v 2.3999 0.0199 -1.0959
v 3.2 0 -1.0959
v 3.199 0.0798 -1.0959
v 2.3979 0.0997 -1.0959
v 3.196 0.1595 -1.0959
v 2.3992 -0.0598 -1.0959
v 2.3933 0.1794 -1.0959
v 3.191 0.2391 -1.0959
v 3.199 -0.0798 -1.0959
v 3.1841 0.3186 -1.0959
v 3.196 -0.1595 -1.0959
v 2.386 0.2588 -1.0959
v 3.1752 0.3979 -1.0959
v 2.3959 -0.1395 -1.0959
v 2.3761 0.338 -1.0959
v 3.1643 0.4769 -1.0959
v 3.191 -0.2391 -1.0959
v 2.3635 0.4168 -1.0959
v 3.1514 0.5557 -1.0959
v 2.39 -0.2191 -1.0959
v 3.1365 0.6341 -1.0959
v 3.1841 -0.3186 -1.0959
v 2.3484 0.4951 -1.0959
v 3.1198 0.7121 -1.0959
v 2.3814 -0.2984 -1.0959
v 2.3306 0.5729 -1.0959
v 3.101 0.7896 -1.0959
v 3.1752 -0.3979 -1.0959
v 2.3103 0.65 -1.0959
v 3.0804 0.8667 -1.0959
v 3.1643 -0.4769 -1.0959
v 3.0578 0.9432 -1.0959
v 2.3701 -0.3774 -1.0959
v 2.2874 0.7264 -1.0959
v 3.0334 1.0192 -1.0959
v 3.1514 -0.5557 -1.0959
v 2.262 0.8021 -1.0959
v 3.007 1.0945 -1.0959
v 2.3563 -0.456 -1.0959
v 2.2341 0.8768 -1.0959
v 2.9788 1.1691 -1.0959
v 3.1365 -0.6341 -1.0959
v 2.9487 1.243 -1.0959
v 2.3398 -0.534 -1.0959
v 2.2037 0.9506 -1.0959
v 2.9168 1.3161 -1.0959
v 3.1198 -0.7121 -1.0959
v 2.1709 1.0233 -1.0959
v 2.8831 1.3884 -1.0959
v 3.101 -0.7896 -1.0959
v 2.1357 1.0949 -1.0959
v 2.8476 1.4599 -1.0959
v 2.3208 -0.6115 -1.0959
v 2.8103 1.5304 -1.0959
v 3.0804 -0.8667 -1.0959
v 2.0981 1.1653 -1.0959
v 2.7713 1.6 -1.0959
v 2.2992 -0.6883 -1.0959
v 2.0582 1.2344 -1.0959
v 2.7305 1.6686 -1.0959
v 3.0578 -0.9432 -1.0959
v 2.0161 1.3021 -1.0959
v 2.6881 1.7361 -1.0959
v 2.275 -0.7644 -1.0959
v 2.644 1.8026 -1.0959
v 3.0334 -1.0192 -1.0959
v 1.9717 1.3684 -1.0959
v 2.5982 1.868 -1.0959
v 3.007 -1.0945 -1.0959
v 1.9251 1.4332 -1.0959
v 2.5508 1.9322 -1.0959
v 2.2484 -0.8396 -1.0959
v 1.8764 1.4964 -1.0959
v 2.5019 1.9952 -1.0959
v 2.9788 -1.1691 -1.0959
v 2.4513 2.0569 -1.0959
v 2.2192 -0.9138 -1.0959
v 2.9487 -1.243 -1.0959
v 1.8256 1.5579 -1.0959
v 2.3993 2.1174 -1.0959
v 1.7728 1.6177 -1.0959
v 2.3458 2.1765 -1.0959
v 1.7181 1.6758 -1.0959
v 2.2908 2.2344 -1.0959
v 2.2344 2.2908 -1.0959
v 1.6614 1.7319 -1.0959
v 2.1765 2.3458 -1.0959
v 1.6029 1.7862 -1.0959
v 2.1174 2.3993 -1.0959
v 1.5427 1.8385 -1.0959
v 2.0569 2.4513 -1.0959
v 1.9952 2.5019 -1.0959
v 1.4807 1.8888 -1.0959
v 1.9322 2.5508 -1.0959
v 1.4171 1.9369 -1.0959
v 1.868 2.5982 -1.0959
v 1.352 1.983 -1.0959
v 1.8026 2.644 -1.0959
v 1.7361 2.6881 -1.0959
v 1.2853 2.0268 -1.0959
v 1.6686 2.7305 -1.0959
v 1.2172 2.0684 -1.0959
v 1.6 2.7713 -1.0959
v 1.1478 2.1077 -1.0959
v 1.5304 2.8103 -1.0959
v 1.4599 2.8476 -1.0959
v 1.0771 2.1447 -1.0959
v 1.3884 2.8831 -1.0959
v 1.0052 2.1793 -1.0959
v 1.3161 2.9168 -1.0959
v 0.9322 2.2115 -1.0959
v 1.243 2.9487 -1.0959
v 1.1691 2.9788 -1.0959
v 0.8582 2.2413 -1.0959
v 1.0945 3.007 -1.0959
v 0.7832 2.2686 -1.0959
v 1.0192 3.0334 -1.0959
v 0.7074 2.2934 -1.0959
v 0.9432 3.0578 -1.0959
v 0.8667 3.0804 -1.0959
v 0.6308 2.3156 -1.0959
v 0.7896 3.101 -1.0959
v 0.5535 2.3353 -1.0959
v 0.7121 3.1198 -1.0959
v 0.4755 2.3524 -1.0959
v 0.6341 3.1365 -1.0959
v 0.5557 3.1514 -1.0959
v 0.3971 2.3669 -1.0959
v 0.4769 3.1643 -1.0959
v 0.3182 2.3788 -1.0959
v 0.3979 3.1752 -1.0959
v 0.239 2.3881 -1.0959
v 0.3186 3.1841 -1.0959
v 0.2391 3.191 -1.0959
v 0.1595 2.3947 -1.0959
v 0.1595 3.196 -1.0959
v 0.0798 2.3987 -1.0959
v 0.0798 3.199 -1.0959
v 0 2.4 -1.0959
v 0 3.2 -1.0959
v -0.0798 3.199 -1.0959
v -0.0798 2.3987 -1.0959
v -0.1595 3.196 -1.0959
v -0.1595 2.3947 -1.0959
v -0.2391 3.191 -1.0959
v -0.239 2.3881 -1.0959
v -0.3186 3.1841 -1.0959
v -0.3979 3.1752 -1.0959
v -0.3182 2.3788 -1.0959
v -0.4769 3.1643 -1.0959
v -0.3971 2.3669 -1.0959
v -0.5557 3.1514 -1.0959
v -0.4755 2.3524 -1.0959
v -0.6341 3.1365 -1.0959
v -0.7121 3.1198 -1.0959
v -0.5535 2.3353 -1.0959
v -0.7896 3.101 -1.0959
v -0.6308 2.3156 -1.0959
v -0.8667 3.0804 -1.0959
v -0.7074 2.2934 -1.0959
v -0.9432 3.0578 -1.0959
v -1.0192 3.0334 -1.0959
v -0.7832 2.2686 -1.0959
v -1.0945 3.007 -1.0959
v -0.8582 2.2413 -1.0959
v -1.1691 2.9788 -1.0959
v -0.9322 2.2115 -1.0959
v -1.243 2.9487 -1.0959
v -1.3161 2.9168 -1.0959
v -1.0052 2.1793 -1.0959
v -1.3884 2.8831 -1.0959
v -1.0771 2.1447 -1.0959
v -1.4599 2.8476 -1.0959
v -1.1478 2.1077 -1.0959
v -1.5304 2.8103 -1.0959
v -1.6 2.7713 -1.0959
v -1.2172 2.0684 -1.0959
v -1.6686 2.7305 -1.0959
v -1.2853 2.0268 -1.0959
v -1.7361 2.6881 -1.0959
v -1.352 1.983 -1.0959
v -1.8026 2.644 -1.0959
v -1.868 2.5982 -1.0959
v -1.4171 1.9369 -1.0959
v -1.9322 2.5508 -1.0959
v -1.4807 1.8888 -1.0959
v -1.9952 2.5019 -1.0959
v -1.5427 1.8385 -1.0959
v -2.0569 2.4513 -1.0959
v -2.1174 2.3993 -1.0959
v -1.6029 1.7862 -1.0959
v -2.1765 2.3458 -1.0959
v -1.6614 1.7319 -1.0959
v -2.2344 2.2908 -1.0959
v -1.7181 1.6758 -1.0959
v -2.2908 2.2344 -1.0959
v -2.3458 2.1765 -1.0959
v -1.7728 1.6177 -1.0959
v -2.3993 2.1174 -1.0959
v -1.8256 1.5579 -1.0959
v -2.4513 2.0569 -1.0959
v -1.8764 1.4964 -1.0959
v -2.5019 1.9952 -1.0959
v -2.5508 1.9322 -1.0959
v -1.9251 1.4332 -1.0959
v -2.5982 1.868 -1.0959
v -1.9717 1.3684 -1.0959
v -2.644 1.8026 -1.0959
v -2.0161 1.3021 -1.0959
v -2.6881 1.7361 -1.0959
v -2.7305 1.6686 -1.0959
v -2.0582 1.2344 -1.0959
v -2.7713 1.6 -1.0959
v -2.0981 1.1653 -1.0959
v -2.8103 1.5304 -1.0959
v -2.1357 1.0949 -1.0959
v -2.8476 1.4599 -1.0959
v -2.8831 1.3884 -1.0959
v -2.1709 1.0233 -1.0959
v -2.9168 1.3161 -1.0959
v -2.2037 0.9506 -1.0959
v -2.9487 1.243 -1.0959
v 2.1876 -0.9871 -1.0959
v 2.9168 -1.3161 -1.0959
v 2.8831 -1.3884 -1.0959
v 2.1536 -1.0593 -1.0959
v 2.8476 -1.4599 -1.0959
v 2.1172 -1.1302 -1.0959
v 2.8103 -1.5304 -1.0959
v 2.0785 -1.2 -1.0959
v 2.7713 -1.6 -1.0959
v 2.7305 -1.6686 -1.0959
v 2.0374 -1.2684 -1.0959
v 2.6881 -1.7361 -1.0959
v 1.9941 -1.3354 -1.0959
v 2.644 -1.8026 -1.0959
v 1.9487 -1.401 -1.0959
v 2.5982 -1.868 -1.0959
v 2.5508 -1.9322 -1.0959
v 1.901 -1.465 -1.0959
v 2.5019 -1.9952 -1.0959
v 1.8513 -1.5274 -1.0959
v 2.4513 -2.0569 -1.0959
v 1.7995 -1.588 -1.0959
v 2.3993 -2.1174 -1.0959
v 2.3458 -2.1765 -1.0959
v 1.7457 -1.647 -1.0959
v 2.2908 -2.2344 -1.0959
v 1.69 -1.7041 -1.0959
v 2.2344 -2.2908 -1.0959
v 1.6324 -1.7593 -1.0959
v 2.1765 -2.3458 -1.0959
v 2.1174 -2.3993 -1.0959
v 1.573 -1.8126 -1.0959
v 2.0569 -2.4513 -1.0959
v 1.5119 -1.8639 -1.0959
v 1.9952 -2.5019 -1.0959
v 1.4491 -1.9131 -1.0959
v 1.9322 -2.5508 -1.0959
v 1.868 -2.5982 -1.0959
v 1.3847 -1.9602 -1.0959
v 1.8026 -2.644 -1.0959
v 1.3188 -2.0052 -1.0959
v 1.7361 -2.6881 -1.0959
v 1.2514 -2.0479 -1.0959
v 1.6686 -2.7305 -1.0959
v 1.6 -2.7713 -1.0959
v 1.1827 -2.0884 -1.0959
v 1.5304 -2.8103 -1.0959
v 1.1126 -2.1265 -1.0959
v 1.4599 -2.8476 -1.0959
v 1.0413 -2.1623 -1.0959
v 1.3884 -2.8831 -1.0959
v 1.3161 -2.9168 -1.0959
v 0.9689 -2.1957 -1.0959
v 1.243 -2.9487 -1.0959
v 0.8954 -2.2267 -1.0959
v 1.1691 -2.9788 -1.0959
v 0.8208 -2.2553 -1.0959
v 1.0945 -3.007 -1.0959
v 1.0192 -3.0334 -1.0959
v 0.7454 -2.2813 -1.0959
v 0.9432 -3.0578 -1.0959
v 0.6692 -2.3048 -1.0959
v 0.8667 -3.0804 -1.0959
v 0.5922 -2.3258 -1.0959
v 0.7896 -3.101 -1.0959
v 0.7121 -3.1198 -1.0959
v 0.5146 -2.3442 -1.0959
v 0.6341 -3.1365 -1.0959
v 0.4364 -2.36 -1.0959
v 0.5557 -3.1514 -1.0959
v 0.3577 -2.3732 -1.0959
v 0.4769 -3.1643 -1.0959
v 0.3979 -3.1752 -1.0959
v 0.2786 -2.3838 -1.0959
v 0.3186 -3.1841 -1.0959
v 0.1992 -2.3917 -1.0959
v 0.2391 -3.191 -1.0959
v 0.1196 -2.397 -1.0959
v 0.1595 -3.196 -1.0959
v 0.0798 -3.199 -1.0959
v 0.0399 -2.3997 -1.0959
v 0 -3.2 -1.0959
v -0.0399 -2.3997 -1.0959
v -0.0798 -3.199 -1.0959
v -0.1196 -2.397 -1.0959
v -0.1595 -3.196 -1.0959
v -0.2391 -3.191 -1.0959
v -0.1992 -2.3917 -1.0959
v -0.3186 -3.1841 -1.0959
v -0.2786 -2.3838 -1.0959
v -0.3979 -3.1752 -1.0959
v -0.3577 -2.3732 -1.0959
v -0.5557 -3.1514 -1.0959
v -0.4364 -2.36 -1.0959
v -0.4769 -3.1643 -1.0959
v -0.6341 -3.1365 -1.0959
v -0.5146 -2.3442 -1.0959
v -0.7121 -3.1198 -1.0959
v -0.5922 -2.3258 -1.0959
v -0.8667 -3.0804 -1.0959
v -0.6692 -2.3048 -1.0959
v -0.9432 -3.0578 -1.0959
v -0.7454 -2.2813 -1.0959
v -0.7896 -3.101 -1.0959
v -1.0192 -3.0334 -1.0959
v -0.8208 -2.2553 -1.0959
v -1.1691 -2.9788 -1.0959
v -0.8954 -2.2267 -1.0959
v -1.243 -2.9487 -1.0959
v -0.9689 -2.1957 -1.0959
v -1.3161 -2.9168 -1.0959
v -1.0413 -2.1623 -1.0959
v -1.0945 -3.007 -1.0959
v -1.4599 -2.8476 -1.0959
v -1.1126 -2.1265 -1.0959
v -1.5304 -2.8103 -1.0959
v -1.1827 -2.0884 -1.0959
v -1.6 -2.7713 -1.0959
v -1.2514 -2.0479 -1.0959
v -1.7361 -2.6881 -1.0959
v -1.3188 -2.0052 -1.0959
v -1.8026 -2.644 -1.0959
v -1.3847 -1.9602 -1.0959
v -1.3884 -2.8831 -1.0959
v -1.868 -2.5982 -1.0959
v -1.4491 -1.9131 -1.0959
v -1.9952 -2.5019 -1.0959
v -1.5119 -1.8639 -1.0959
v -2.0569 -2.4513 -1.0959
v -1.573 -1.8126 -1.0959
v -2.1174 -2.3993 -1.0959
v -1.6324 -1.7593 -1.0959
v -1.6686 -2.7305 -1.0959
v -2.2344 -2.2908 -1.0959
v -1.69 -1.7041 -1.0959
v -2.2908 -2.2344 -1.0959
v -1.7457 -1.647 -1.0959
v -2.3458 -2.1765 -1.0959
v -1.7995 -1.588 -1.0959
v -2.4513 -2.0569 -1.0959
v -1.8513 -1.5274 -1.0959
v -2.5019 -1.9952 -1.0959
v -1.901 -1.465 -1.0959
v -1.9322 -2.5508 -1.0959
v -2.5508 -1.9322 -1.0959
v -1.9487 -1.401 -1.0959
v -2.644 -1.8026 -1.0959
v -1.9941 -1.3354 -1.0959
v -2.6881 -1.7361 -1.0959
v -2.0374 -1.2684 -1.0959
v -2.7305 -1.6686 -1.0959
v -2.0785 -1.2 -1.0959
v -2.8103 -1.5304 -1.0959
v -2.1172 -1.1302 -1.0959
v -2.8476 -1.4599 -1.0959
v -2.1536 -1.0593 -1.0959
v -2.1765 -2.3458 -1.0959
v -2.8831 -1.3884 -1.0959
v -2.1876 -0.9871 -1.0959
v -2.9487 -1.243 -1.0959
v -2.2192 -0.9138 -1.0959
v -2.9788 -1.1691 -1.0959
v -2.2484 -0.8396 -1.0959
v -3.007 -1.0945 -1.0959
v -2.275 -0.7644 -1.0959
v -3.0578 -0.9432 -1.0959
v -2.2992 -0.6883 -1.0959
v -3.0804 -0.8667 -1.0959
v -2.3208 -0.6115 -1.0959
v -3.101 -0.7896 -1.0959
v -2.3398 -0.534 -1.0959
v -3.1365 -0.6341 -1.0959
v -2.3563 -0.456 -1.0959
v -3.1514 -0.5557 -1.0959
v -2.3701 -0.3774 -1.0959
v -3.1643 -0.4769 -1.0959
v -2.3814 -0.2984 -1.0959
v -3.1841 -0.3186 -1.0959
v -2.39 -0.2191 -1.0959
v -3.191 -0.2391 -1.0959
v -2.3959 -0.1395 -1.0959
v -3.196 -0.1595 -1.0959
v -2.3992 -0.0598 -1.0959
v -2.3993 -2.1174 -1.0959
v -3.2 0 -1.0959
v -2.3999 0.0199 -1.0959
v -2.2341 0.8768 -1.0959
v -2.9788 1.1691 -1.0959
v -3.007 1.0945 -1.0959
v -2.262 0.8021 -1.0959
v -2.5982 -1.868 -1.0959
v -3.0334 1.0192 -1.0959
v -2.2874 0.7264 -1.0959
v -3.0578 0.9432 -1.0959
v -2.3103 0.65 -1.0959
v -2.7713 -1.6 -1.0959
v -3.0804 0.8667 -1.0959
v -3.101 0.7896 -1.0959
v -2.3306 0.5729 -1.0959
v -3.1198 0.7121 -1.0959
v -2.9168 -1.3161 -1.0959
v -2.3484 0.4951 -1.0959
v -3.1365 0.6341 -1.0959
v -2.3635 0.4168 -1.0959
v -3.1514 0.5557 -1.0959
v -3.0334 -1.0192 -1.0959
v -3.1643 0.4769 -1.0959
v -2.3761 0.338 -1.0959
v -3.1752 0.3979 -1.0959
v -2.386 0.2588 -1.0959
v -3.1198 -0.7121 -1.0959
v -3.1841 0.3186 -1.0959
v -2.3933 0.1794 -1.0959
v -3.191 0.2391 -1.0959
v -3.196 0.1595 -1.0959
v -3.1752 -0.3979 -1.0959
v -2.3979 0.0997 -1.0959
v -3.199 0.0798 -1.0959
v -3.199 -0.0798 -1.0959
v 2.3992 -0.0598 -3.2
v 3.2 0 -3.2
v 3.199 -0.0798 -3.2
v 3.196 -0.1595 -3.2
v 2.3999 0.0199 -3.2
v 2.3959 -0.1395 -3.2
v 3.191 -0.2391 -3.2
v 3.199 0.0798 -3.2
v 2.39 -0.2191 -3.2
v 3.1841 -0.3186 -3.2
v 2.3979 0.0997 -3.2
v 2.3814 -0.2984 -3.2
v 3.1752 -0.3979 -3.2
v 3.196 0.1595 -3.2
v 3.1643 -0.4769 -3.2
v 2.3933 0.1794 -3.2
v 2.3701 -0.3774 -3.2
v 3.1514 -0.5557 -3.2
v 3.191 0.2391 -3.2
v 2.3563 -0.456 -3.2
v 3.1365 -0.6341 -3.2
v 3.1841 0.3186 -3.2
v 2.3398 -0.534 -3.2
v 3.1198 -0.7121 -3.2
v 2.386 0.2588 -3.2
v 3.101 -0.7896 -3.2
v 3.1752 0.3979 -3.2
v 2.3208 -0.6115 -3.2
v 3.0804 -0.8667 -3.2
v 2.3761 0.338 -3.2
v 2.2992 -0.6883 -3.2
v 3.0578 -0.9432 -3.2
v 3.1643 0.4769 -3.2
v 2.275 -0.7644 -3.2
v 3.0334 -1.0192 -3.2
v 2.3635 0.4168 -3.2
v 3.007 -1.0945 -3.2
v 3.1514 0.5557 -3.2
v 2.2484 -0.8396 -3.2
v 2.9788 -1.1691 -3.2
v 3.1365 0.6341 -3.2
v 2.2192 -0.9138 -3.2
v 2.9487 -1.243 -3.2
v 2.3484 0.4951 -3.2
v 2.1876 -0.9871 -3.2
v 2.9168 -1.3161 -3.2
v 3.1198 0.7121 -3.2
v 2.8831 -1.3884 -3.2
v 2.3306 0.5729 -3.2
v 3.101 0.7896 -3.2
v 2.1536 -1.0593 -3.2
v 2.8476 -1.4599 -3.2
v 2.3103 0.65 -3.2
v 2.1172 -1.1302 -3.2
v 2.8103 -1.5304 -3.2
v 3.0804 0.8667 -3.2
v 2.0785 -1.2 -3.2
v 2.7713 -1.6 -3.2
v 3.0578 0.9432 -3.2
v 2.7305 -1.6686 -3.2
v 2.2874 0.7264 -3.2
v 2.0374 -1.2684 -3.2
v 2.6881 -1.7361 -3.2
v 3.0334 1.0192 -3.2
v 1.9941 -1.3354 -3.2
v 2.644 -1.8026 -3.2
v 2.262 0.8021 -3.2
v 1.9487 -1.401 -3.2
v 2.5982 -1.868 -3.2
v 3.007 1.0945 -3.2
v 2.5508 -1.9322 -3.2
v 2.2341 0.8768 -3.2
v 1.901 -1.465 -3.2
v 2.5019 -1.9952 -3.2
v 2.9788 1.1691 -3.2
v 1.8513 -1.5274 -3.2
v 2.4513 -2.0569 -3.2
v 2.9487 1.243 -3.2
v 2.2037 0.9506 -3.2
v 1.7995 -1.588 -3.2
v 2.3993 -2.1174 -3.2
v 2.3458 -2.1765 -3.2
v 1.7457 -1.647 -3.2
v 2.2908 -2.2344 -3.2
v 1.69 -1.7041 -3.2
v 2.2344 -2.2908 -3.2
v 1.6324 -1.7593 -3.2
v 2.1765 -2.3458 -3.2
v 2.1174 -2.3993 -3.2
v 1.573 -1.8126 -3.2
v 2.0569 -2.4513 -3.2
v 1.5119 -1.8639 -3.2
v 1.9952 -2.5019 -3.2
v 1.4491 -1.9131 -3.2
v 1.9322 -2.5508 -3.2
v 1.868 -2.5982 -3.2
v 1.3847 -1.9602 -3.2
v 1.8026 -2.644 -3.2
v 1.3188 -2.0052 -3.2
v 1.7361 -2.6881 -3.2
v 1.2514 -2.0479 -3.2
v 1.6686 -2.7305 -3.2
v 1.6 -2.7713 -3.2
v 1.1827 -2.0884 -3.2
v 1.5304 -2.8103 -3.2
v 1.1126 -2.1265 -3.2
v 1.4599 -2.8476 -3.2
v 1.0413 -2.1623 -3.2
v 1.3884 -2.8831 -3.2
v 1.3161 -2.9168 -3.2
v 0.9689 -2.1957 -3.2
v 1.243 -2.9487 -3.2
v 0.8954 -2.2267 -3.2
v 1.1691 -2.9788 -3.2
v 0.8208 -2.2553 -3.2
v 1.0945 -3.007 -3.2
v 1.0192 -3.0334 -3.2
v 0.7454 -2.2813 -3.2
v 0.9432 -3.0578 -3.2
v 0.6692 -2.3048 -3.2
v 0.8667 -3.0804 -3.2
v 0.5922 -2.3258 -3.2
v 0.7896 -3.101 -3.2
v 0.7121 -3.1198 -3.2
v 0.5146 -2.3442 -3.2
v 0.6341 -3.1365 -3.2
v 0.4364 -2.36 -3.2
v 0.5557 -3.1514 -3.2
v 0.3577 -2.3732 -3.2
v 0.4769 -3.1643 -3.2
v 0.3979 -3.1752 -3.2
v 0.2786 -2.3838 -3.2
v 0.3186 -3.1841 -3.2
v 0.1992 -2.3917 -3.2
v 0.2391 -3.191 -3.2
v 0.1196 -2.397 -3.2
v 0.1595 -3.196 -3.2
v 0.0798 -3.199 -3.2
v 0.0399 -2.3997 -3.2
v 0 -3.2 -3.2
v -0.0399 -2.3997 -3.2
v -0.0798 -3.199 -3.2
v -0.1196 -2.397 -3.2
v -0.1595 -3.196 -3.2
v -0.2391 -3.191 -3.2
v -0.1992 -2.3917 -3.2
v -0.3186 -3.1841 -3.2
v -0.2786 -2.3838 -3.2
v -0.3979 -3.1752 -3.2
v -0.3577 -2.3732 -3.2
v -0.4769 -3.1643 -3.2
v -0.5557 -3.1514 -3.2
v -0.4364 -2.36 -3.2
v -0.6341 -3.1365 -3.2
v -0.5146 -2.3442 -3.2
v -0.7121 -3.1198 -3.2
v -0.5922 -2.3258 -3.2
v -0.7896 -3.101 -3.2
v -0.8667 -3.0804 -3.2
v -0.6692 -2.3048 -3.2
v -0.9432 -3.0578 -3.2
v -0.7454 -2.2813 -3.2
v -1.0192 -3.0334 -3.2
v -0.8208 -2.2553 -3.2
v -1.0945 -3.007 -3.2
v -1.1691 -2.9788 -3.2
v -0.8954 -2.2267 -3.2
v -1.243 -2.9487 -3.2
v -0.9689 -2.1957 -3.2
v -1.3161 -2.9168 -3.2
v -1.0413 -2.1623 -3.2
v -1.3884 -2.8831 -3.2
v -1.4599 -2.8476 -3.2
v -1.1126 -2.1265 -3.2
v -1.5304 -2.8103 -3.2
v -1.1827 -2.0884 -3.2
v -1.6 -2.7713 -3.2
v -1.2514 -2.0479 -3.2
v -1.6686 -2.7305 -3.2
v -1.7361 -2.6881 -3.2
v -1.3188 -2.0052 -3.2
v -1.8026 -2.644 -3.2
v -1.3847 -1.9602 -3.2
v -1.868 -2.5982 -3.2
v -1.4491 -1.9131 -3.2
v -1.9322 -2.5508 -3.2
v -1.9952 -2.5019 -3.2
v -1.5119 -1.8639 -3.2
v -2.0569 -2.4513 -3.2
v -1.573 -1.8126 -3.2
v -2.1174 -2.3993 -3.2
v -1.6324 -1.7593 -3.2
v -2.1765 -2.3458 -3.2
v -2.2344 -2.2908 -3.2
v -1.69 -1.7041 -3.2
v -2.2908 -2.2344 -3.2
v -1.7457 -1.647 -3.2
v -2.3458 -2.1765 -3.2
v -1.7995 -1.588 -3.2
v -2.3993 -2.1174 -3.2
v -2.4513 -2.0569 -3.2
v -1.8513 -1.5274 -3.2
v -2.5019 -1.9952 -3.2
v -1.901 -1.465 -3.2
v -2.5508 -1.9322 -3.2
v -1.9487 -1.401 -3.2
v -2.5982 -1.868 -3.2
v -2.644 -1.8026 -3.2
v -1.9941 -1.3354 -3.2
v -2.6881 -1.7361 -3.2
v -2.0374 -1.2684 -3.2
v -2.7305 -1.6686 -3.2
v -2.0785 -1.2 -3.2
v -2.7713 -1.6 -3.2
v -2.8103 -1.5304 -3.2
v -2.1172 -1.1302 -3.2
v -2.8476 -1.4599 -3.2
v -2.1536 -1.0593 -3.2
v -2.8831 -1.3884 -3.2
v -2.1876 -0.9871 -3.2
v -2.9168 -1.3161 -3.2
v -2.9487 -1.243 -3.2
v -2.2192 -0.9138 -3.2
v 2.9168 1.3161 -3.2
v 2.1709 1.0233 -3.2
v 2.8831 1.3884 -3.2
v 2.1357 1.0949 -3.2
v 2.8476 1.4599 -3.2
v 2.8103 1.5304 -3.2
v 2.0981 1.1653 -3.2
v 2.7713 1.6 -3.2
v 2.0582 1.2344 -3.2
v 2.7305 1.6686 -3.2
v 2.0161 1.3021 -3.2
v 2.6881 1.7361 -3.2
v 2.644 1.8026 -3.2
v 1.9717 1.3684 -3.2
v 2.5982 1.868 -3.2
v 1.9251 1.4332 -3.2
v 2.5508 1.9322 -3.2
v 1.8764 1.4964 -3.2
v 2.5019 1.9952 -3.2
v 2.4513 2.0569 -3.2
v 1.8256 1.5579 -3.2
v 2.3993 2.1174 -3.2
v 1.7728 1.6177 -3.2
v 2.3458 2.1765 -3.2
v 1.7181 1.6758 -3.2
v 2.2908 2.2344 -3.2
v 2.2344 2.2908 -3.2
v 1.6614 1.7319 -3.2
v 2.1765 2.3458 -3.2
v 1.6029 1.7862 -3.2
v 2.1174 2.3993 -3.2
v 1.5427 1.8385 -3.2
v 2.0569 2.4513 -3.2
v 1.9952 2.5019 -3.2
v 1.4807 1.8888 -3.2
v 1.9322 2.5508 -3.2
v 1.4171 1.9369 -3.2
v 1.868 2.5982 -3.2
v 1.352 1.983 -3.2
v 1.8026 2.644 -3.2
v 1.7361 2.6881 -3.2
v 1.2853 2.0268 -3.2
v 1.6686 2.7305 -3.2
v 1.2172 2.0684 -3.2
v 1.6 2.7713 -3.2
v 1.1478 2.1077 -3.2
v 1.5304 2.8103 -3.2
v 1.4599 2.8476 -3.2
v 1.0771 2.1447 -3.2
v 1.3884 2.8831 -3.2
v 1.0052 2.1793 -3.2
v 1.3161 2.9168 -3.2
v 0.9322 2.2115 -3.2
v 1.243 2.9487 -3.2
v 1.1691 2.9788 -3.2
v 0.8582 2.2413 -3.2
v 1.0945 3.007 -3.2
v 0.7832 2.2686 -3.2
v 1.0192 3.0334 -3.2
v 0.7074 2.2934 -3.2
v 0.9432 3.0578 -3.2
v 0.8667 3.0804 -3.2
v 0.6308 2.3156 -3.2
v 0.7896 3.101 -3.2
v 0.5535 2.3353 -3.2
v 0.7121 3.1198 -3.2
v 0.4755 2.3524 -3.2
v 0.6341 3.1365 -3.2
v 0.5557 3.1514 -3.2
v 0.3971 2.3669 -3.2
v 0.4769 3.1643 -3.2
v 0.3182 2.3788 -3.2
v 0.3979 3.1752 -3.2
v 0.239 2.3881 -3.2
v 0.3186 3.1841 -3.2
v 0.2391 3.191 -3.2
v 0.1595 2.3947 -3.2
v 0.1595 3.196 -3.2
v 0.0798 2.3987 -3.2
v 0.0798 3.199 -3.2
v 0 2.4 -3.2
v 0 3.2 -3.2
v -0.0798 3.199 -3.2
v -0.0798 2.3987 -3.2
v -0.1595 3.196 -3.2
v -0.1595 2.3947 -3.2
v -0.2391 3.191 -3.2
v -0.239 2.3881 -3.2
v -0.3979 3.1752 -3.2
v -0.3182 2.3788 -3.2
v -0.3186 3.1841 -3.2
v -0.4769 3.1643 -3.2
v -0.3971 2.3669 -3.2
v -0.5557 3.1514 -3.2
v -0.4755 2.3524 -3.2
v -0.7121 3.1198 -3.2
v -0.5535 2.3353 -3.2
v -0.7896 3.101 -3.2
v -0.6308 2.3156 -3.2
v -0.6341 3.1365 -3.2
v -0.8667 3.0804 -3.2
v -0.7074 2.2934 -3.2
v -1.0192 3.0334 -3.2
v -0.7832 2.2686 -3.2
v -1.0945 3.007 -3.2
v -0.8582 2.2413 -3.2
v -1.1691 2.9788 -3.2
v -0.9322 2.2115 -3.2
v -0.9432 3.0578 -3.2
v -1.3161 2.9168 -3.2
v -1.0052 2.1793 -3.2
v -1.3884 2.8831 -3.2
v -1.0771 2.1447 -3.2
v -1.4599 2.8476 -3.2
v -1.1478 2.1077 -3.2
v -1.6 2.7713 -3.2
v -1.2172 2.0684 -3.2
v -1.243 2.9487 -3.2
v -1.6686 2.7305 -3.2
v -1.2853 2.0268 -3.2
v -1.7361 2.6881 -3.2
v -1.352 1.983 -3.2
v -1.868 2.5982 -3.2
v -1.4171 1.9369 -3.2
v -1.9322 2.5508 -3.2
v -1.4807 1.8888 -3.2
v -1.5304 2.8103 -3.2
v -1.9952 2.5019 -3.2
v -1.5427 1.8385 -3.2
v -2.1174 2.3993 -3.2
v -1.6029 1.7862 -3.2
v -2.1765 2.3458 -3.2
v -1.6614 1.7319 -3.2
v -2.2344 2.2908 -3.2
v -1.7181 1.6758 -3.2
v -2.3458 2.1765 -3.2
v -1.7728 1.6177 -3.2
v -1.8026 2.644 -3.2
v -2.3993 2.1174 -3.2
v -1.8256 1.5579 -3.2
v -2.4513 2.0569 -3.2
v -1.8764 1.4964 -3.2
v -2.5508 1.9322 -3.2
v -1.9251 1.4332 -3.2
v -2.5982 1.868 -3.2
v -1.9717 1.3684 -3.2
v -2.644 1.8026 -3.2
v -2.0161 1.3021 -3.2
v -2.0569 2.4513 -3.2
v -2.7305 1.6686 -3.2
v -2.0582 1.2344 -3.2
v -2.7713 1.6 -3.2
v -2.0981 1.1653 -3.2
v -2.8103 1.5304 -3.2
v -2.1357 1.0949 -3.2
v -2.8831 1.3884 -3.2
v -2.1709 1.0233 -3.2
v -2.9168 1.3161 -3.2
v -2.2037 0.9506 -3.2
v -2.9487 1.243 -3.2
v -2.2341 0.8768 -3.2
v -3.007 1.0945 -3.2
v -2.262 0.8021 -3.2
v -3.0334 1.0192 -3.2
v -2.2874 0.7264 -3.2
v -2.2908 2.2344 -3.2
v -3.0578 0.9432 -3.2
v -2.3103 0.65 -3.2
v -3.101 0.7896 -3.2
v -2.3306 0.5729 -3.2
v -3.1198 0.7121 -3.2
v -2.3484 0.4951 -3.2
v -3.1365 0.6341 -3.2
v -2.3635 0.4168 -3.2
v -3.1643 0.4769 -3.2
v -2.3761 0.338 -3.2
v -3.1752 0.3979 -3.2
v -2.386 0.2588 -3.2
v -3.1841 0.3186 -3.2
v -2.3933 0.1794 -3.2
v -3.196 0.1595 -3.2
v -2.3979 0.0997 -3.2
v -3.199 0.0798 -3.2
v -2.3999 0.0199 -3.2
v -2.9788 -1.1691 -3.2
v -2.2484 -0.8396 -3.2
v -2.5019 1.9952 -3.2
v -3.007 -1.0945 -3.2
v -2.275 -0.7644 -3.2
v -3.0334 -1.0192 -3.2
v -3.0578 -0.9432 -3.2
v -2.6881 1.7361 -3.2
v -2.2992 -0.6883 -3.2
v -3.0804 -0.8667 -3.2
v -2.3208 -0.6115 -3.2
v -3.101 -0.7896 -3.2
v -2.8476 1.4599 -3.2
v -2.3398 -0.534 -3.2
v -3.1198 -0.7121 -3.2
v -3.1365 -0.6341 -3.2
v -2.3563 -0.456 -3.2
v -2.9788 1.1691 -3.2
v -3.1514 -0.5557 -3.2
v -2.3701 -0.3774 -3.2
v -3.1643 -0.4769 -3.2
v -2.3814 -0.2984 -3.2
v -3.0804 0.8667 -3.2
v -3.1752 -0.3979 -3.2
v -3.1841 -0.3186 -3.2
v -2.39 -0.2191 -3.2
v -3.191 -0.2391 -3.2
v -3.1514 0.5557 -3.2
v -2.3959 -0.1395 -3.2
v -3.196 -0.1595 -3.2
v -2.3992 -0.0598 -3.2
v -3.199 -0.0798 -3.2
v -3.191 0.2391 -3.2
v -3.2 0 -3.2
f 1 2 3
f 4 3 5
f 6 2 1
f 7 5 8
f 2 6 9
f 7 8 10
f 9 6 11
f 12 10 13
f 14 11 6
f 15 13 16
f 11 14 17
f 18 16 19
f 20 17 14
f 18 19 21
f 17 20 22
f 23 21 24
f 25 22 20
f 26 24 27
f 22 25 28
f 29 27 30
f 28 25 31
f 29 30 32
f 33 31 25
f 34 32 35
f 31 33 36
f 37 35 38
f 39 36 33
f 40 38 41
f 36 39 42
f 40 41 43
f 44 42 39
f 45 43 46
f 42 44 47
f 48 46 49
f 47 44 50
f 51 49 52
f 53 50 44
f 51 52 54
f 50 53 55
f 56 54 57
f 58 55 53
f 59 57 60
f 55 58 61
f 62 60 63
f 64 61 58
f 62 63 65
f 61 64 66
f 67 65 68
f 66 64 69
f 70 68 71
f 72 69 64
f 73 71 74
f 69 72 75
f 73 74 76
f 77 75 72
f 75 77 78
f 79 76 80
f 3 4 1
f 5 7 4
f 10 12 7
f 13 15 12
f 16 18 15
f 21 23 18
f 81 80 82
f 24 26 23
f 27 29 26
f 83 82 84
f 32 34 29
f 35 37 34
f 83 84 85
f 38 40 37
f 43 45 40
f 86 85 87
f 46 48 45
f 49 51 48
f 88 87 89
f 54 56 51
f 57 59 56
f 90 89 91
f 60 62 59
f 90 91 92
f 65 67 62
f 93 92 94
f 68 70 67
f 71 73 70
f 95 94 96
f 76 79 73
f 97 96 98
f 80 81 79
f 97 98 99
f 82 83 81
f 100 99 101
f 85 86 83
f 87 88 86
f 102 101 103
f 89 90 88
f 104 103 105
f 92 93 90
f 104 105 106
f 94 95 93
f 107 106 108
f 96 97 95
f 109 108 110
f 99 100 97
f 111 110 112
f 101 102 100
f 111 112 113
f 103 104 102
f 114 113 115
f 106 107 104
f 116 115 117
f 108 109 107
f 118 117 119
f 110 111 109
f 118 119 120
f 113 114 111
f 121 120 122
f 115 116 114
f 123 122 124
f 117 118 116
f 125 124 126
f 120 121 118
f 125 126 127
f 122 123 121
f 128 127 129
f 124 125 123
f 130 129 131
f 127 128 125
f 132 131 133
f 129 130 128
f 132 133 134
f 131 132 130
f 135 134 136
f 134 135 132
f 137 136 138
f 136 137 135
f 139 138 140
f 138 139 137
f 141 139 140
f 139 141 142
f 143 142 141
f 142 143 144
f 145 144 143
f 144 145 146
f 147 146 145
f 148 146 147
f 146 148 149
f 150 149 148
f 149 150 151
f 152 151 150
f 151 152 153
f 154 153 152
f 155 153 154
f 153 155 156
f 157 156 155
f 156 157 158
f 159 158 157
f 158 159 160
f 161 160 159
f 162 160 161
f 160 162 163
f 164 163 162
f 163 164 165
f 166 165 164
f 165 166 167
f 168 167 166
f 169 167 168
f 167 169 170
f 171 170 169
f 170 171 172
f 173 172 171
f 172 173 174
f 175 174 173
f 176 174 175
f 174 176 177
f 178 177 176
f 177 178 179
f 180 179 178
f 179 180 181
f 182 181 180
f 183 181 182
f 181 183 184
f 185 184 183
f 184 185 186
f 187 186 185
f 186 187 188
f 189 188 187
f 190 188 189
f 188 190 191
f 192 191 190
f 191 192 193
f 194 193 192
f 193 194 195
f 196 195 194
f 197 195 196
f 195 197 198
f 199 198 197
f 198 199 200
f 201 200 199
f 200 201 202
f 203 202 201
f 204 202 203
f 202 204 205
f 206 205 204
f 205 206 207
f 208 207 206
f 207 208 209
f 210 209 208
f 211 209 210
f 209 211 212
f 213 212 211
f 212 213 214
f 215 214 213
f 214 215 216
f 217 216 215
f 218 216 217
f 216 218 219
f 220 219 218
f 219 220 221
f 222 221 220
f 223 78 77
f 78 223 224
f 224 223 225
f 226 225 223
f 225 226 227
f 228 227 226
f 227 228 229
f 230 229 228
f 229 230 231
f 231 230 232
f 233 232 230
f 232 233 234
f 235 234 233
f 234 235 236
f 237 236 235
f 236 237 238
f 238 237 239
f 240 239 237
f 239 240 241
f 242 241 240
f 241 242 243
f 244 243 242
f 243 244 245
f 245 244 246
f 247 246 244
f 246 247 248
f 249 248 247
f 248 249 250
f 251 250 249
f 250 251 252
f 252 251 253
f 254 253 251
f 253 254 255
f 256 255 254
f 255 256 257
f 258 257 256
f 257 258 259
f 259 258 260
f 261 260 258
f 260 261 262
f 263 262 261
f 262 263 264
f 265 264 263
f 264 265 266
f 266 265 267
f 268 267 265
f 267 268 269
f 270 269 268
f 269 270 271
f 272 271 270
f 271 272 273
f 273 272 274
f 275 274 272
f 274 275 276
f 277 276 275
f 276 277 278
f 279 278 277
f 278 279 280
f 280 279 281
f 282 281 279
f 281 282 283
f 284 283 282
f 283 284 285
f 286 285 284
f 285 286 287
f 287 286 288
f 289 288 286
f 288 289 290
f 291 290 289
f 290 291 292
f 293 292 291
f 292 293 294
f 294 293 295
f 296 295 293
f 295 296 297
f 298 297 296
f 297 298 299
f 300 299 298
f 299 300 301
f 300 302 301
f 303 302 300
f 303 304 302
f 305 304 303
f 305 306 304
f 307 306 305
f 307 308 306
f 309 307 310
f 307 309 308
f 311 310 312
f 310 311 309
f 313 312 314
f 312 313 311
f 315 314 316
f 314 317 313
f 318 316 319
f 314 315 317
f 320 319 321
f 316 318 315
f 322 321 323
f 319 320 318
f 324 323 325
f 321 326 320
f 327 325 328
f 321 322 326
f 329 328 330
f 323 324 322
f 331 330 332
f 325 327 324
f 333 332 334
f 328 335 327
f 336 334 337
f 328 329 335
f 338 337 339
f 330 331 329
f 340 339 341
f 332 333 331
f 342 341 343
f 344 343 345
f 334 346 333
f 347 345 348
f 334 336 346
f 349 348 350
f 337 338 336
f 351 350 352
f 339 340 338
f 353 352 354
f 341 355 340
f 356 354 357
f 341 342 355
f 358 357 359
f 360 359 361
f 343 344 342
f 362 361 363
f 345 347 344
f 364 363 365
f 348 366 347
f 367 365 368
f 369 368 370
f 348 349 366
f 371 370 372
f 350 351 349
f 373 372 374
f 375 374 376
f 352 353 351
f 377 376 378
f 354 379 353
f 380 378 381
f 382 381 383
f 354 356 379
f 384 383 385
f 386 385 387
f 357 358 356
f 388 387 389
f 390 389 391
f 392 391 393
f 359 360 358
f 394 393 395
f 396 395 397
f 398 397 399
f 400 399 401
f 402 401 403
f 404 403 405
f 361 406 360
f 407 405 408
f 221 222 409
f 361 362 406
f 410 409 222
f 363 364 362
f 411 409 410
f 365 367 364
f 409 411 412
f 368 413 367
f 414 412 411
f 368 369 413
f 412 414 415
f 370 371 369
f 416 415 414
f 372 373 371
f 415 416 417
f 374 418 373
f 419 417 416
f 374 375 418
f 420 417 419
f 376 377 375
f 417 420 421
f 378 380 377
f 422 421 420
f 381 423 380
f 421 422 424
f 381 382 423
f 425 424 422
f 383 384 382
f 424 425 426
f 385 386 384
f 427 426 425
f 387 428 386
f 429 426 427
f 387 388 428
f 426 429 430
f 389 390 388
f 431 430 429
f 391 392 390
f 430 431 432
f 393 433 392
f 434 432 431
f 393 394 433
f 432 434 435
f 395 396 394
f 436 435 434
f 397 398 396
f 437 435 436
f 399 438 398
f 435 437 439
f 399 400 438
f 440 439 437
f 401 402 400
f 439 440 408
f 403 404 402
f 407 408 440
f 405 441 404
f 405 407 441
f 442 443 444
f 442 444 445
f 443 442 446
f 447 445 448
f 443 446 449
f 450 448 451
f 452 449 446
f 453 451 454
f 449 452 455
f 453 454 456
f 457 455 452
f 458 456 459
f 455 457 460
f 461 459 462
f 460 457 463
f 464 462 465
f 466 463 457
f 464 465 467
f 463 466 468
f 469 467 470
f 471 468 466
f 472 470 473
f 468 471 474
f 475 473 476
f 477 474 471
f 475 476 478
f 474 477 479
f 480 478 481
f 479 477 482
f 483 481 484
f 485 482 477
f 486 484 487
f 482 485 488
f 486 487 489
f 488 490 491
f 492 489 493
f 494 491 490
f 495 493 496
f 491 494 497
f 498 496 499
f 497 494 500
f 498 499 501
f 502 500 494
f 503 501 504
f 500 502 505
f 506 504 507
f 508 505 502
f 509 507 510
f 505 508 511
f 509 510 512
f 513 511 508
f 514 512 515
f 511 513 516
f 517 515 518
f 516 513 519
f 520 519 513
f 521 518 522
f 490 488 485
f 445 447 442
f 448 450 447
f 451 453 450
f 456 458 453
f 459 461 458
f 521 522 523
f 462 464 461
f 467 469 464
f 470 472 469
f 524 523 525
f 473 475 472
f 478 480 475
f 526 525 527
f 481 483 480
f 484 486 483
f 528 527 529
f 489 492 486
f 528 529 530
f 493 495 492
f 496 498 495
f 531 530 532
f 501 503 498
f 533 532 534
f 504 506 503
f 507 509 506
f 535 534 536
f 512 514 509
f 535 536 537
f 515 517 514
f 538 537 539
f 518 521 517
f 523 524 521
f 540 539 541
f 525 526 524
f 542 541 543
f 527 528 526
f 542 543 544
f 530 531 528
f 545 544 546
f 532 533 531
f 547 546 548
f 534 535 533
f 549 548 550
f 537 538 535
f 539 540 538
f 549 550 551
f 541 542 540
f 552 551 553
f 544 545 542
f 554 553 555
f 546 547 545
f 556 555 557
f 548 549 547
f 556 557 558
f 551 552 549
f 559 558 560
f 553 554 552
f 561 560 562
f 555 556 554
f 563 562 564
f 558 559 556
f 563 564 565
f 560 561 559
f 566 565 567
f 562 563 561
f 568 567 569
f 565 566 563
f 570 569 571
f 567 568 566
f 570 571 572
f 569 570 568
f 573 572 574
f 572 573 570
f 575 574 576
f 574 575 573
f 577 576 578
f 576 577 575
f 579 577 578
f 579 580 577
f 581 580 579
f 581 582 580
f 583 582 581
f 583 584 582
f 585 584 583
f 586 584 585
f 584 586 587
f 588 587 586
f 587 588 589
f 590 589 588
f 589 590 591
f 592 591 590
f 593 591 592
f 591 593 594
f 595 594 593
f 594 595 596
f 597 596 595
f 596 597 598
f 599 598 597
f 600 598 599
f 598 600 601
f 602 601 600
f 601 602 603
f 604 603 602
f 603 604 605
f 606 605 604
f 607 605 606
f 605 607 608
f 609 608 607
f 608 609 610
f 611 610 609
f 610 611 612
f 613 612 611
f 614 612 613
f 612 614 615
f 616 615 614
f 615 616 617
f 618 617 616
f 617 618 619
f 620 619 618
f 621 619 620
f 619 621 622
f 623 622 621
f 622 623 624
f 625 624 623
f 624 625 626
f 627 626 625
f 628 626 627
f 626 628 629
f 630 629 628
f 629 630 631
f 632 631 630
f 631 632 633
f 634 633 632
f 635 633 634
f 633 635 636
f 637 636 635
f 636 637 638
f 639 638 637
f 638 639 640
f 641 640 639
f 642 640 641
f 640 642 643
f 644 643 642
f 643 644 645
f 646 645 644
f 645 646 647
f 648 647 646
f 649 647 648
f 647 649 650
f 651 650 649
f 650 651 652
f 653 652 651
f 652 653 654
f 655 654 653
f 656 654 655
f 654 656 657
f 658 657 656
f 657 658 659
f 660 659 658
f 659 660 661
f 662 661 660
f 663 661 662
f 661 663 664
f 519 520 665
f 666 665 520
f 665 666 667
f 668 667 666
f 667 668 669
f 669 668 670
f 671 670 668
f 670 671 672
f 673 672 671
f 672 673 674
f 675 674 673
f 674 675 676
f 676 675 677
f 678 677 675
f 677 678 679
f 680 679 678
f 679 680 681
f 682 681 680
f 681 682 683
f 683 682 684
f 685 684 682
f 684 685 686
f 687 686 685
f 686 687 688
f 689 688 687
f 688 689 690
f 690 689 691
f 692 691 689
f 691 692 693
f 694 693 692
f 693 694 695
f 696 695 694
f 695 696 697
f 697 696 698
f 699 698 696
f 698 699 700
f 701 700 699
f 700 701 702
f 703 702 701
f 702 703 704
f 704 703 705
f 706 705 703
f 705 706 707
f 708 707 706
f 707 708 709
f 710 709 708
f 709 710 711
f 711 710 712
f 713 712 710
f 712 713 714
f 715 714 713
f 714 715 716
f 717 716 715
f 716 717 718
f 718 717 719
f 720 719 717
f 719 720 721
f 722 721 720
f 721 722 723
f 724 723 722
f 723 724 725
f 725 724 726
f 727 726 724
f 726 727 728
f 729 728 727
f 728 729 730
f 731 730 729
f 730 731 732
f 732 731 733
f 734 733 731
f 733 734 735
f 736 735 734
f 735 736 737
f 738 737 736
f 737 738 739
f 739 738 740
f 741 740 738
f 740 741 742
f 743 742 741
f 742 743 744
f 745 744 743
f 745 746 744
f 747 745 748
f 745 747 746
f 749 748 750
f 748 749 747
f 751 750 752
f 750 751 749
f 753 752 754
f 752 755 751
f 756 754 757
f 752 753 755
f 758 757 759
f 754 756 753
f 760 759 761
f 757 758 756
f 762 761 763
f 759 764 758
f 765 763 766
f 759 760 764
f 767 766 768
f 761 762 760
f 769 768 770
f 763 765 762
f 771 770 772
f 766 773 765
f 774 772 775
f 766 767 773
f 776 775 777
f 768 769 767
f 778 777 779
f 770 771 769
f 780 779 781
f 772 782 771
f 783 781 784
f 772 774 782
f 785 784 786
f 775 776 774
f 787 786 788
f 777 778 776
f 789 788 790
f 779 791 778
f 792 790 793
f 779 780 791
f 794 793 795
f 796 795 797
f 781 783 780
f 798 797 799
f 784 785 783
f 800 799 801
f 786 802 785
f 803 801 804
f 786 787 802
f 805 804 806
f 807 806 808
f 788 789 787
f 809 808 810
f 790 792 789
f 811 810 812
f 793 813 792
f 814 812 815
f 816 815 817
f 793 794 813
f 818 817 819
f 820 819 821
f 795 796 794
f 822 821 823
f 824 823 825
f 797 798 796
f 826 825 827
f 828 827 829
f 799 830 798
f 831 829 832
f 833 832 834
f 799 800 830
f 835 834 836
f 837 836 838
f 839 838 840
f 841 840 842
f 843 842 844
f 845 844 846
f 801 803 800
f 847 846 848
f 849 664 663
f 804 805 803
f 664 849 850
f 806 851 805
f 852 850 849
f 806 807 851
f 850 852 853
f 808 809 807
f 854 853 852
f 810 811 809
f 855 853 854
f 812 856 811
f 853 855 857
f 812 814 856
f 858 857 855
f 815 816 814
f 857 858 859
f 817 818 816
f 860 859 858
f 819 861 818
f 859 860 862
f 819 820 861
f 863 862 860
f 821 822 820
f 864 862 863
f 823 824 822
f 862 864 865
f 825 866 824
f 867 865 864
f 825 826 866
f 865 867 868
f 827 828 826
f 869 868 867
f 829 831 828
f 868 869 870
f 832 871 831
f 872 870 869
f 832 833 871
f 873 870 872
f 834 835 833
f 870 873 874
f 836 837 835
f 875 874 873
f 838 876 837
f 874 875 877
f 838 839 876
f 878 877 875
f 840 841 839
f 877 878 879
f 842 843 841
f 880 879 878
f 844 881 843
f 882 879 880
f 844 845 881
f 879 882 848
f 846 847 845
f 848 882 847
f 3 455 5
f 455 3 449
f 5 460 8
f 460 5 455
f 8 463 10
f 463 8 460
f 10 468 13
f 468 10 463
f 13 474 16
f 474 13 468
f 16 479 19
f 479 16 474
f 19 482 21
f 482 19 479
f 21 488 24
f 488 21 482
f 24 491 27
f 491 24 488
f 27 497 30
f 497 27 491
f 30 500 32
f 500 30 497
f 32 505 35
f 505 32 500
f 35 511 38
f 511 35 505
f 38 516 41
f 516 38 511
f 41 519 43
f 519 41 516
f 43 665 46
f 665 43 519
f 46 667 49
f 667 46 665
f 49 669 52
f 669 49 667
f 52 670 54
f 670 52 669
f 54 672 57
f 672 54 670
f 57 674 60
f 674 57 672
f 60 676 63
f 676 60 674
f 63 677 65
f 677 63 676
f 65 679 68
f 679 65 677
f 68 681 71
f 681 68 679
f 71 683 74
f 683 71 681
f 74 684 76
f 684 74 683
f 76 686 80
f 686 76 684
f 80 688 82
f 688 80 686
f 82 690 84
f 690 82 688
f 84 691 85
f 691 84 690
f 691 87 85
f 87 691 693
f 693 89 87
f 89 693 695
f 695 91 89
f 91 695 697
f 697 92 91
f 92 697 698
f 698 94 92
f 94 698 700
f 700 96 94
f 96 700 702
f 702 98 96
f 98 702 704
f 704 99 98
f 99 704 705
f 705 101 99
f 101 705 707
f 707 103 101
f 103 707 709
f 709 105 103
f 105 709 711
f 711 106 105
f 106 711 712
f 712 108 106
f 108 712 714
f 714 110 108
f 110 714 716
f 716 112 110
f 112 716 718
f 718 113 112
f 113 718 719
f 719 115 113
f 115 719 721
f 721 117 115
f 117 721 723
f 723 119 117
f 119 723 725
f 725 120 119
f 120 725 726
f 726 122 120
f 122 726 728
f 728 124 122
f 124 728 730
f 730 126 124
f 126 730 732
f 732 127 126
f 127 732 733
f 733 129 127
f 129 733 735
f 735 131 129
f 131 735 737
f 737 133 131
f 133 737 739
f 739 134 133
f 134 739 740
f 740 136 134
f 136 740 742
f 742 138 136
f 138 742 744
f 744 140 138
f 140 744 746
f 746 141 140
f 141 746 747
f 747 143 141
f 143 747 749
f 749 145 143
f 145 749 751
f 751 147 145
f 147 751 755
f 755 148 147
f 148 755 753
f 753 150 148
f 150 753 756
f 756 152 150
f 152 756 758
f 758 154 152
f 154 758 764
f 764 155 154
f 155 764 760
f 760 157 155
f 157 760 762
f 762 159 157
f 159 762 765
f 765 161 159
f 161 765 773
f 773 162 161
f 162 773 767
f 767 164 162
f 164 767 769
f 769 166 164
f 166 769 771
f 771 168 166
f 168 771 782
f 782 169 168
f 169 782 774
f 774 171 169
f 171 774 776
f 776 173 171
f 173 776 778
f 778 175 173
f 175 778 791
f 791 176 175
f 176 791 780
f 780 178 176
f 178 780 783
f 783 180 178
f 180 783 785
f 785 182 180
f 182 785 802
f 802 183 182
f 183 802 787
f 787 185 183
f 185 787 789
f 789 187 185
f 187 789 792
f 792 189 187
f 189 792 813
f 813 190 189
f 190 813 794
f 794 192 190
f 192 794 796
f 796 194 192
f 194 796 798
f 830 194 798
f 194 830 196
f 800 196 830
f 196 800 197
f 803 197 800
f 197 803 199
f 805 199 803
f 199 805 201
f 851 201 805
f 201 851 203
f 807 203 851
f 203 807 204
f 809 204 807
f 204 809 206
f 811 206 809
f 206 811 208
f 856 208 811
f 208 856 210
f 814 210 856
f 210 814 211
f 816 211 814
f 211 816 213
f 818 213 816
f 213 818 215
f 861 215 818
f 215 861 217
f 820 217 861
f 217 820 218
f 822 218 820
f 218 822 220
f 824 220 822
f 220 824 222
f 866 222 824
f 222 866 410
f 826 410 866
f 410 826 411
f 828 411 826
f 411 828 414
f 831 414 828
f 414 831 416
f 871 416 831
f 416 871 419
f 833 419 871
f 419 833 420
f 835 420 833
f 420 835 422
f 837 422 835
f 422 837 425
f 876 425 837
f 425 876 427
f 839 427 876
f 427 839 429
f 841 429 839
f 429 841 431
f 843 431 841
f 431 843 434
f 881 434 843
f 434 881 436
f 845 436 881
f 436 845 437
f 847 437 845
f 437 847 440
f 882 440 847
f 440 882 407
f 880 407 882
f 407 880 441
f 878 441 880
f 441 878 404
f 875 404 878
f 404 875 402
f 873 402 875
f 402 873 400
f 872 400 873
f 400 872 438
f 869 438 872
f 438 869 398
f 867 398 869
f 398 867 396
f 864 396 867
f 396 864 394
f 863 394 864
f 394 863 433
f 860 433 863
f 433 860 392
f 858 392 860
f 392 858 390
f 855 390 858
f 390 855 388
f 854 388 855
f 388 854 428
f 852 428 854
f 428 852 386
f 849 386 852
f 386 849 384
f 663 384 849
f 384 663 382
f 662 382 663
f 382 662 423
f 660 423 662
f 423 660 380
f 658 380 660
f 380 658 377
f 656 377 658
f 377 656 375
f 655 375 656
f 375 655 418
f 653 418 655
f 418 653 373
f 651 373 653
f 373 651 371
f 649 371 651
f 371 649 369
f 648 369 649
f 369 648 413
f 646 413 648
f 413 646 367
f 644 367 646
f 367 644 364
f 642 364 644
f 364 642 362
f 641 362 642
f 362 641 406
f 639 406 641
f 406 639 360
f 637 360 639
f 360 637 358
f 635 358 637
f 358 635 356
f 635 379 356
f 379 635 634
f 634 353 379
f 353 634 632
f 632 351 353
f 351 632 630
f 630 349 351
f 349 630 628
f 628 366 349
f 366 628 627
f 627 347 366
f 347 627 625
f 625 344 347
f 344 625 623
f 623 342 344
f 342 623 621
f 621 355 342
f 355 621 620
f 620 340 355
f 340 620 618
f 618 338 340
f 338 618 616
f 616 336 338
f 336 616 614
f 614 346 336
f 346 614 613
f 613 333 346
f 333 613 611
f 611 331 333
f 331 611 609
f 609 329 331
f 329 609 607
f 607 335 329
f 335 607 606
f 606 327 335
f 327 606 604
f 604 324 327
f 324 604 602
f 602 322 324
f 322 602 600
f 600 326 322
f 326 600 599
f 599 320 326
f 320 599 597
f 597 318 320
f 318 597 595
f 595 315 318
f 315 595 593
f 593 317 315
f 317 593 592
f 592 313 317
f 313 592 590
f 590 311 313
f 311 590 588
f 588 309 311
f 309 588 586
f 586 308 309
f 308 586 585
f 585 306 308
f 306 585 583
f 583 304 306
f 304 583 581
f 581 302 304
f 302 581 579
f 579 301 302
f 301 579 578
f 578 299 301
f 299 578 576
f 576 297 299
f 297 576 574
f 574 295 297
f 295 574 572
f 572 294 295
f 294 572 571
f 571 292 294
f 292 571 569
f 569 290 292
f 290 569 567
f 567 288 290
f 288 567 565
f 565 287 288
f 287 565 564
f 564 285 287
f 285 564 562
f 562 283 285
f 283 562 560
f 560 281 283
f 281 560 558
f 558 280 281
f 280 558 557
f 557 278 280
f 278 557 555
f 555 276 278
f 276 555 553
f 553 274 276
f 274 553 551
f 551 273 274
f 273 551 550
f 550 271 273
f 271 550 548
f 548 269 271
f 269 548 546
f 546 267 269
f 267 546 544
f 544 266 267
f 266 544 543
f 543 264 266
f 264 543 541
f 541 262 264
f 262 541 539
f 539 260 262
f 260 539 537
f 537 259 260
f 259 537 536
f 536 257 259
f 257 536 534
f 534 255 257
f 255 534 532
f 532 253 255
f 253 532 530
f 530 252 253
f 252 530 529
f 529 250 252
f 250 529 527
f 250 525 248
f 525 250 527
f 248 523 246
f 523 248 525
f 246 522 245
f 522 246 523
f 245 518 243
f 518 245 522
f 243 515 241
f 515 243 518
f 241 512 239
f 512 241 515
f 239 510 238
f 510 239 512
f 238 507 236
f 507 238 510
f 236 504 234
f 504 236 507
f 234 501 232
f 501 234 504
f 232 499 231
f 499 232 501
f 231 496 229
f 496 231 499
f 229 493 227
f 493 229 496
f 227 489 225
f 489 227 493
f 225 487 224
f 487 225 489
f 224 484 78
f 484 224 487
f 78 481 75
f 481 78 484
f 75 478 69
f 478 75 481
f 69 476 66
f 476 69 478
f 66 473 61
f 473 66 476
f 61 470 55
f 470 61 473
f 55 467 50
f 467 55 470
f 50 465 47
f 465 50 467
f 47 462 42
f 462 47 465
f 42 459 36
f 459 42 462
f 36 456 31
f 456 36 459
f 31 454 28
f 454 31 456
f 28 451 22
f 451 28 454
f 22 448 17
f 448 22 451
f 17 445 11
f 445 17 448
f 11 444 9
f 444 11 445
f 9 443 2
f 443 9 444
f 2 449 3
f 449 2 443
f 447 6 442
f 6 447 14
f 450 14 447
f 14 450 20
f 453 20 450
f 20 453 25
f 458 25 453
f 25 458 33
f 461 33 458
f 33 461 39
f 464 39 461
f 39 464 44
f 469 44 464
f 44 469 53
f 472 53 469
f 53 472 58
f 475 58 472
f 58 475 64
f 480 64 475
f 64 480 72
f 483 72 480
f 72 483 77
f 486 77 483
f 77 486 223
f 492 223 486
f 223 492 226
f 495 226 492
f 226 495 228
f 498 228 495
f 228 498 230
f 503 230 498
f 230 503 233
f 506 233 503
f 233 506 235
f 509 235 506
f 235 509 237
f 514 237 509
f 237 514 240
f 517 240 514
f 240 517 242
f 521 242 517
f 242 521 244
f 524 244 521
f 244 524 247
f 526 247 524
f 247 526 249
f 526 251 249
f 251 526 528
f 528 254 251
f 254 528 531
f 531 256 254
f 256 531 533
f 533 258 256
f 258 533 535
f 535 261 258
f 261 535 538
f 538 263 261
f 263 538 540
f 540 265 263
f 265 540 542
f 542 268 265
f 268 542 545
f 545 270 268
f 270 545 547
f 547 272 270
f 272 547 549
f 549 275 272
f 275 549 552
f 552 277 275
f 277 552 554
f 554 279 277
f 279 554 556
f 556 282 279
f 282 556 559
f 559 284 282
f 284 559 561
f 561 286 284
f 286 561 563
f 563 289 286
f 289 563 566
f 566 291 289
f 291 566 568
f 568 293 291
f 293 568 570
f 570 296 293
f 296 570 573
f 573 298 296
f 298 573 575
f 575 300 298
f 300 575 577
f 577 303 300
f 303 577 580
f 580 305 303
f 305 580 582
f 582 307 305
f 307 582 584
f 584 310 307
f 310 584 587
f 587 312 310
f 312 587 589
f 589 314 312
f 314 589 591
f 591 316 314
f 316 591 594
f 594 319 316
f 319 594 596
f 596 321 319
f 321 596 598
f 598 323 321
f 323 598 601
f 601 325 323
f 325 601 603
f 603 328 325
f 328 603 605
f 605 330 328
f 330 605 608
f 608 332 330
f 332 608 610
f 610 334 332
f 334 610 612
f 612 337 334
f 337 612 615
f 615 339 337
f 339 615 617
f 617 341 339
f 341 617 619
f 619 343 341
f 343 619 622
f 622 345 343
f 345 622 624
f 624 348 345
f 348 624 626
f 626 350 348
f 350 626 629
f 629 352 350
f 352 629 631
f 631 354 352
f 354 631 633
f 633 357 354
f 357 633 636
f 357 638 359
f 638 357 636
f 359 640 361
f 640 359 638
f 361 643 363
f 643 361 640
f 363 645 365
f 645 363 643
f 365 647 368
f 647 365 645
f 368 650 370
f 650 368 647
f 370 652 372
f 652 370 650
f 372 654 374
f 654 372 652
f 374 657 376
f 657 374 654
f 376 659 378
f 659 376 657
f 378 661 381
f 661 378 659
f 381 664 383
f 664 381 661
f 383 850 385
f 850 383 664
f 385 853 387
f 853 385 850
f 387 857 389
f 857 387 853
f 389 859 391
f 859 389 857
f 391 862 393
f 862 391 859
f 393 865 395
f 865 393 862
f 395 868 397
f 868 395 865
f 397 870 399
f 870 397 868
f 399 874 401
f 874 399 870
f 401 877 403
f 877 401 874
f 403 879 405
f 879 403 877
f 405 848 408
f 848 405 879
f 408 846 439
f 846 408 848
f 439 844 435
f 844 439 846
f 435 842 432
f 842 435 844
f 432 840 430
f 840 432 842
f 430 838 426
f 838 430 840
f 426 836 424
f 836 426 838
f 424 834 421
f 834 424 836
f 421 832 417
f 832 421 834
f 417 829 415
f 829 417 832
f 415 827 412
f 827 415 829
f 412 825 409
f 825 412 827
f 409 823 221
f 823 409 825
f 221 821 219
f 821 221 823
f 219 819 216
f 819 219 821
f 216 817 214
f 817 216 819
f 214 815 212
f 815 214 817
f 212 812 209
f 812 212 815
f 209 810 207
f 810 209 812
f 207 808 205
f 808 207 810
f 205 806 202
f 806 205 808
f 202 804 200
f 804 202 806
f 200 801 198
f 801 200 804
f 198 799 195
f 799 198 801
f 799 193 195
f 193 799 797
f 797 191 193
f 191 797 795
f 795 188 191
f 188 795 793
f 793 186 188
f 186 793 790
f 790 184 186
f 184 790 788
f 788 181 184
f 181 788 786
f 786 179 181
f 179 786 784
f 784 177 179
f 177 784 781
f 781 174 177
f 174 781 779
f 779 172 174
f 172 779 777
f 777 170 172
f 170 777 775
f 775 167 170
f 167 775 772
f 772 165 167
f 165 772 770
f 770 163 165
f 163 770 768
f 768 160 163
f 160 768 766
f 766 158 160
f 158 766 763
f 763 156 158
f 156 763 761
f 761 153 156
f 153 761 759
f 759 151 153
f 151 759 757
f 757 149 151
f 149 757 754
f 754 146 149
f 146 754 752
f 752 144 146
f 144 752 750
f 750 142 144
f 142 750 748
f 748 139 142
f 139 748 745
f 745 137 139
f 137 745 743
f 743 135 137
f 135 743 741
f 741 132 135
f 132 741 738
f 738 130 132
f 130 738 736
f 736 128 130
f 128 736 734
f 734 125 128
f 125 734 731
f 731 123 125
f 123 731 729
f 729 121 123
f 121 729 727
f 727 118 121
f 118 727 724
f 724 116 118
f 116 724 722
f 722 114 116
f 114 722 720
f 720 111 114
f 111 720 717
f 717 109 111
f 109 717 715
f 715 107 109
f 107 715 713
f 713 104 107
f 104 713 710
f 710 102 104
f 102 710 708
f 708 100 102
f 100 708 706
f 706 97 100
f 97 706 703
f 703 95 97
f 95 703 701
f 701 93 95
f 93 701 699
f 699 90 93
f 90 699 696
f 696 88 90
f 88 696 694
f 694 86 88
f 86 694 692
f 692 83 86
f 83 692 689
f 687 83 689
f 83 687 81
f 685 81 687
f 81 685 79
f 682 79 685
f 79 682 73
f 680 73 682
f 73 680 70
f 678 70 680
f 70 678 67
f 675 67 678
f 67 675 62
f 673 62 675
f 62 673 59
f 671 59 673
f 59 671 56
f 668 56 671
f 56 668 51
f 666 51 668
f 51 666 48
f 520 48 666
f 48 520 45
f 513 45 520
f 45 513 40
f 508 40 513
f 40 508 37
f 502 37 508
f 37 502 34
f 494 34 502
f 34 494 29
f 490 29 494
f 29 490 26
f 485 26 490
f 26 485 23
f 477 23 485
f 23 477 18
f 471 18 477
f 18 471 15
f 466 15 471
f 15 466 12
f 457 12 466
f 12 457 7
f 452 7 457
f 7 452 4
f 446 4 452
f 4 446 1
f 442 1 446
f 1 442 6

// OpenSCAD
use <../lib.scad>
use <48245.scad>
use <71861.scad>
$fa=1; $fs=0.2;
function ldraw_lib__48245c02(realsolid=false) = [
// 0 Bucket  2 x  2 with Hanging Handle
// 0 Name: 48245c02.dat
// 0 Author: Max Martin Richter [MMR1988]
// 0 !LDRAW_ORG Shortcut UPDATE 2012-03
// 0 !LICENSE Licensed under CC BY 2.0 and CC BY 4.0 : see CAreadme.txt
// 
// 0 !HELP Part is designed for using it standing on plates/ground
// 
// 0 BFC CERTIFY CCW
  [0,"BFC","CERTIFY"],
  [0,"BFC","CCW"],
// 
// 0 !CATEGORY Container
// 
// 0 !HISTORY 2012-12-28 [PTadmin] Official Update 2012-03
// 
// 
// 1 16 0 0 0 -1 0 0 0 1 0 0 0 -1 48245.dat
  [1,16,0,0,0,-1,0,0,0,1,0,0,0,-1, ldraw_lib__48245(realsolid)],
// 1 16 0 -35 0 -0.7071 -0.5801 -0.4043 0 -0.5717 0.8205 -0.7071 0.5801 0.4043 71861.dat
  [1,16,0,-35,0,-0.7071,-0.5801,-0.4043,0,-0.5717,0.8205,-0.7071,0.5801,0.4043, ldraw_lib__71861(realsolid)],
];
module ldraw_lib__48245c02(step=0, col=false, unit=2/5, alt=false, line=0.2, solid=!$preview)
    makepoly(ldraw_lib__48245c02(solid), step=step, col=col, unit=unit, alt=alt, line=line, solid=solid);
ldraw_lib__48245c02(line=0.2);
